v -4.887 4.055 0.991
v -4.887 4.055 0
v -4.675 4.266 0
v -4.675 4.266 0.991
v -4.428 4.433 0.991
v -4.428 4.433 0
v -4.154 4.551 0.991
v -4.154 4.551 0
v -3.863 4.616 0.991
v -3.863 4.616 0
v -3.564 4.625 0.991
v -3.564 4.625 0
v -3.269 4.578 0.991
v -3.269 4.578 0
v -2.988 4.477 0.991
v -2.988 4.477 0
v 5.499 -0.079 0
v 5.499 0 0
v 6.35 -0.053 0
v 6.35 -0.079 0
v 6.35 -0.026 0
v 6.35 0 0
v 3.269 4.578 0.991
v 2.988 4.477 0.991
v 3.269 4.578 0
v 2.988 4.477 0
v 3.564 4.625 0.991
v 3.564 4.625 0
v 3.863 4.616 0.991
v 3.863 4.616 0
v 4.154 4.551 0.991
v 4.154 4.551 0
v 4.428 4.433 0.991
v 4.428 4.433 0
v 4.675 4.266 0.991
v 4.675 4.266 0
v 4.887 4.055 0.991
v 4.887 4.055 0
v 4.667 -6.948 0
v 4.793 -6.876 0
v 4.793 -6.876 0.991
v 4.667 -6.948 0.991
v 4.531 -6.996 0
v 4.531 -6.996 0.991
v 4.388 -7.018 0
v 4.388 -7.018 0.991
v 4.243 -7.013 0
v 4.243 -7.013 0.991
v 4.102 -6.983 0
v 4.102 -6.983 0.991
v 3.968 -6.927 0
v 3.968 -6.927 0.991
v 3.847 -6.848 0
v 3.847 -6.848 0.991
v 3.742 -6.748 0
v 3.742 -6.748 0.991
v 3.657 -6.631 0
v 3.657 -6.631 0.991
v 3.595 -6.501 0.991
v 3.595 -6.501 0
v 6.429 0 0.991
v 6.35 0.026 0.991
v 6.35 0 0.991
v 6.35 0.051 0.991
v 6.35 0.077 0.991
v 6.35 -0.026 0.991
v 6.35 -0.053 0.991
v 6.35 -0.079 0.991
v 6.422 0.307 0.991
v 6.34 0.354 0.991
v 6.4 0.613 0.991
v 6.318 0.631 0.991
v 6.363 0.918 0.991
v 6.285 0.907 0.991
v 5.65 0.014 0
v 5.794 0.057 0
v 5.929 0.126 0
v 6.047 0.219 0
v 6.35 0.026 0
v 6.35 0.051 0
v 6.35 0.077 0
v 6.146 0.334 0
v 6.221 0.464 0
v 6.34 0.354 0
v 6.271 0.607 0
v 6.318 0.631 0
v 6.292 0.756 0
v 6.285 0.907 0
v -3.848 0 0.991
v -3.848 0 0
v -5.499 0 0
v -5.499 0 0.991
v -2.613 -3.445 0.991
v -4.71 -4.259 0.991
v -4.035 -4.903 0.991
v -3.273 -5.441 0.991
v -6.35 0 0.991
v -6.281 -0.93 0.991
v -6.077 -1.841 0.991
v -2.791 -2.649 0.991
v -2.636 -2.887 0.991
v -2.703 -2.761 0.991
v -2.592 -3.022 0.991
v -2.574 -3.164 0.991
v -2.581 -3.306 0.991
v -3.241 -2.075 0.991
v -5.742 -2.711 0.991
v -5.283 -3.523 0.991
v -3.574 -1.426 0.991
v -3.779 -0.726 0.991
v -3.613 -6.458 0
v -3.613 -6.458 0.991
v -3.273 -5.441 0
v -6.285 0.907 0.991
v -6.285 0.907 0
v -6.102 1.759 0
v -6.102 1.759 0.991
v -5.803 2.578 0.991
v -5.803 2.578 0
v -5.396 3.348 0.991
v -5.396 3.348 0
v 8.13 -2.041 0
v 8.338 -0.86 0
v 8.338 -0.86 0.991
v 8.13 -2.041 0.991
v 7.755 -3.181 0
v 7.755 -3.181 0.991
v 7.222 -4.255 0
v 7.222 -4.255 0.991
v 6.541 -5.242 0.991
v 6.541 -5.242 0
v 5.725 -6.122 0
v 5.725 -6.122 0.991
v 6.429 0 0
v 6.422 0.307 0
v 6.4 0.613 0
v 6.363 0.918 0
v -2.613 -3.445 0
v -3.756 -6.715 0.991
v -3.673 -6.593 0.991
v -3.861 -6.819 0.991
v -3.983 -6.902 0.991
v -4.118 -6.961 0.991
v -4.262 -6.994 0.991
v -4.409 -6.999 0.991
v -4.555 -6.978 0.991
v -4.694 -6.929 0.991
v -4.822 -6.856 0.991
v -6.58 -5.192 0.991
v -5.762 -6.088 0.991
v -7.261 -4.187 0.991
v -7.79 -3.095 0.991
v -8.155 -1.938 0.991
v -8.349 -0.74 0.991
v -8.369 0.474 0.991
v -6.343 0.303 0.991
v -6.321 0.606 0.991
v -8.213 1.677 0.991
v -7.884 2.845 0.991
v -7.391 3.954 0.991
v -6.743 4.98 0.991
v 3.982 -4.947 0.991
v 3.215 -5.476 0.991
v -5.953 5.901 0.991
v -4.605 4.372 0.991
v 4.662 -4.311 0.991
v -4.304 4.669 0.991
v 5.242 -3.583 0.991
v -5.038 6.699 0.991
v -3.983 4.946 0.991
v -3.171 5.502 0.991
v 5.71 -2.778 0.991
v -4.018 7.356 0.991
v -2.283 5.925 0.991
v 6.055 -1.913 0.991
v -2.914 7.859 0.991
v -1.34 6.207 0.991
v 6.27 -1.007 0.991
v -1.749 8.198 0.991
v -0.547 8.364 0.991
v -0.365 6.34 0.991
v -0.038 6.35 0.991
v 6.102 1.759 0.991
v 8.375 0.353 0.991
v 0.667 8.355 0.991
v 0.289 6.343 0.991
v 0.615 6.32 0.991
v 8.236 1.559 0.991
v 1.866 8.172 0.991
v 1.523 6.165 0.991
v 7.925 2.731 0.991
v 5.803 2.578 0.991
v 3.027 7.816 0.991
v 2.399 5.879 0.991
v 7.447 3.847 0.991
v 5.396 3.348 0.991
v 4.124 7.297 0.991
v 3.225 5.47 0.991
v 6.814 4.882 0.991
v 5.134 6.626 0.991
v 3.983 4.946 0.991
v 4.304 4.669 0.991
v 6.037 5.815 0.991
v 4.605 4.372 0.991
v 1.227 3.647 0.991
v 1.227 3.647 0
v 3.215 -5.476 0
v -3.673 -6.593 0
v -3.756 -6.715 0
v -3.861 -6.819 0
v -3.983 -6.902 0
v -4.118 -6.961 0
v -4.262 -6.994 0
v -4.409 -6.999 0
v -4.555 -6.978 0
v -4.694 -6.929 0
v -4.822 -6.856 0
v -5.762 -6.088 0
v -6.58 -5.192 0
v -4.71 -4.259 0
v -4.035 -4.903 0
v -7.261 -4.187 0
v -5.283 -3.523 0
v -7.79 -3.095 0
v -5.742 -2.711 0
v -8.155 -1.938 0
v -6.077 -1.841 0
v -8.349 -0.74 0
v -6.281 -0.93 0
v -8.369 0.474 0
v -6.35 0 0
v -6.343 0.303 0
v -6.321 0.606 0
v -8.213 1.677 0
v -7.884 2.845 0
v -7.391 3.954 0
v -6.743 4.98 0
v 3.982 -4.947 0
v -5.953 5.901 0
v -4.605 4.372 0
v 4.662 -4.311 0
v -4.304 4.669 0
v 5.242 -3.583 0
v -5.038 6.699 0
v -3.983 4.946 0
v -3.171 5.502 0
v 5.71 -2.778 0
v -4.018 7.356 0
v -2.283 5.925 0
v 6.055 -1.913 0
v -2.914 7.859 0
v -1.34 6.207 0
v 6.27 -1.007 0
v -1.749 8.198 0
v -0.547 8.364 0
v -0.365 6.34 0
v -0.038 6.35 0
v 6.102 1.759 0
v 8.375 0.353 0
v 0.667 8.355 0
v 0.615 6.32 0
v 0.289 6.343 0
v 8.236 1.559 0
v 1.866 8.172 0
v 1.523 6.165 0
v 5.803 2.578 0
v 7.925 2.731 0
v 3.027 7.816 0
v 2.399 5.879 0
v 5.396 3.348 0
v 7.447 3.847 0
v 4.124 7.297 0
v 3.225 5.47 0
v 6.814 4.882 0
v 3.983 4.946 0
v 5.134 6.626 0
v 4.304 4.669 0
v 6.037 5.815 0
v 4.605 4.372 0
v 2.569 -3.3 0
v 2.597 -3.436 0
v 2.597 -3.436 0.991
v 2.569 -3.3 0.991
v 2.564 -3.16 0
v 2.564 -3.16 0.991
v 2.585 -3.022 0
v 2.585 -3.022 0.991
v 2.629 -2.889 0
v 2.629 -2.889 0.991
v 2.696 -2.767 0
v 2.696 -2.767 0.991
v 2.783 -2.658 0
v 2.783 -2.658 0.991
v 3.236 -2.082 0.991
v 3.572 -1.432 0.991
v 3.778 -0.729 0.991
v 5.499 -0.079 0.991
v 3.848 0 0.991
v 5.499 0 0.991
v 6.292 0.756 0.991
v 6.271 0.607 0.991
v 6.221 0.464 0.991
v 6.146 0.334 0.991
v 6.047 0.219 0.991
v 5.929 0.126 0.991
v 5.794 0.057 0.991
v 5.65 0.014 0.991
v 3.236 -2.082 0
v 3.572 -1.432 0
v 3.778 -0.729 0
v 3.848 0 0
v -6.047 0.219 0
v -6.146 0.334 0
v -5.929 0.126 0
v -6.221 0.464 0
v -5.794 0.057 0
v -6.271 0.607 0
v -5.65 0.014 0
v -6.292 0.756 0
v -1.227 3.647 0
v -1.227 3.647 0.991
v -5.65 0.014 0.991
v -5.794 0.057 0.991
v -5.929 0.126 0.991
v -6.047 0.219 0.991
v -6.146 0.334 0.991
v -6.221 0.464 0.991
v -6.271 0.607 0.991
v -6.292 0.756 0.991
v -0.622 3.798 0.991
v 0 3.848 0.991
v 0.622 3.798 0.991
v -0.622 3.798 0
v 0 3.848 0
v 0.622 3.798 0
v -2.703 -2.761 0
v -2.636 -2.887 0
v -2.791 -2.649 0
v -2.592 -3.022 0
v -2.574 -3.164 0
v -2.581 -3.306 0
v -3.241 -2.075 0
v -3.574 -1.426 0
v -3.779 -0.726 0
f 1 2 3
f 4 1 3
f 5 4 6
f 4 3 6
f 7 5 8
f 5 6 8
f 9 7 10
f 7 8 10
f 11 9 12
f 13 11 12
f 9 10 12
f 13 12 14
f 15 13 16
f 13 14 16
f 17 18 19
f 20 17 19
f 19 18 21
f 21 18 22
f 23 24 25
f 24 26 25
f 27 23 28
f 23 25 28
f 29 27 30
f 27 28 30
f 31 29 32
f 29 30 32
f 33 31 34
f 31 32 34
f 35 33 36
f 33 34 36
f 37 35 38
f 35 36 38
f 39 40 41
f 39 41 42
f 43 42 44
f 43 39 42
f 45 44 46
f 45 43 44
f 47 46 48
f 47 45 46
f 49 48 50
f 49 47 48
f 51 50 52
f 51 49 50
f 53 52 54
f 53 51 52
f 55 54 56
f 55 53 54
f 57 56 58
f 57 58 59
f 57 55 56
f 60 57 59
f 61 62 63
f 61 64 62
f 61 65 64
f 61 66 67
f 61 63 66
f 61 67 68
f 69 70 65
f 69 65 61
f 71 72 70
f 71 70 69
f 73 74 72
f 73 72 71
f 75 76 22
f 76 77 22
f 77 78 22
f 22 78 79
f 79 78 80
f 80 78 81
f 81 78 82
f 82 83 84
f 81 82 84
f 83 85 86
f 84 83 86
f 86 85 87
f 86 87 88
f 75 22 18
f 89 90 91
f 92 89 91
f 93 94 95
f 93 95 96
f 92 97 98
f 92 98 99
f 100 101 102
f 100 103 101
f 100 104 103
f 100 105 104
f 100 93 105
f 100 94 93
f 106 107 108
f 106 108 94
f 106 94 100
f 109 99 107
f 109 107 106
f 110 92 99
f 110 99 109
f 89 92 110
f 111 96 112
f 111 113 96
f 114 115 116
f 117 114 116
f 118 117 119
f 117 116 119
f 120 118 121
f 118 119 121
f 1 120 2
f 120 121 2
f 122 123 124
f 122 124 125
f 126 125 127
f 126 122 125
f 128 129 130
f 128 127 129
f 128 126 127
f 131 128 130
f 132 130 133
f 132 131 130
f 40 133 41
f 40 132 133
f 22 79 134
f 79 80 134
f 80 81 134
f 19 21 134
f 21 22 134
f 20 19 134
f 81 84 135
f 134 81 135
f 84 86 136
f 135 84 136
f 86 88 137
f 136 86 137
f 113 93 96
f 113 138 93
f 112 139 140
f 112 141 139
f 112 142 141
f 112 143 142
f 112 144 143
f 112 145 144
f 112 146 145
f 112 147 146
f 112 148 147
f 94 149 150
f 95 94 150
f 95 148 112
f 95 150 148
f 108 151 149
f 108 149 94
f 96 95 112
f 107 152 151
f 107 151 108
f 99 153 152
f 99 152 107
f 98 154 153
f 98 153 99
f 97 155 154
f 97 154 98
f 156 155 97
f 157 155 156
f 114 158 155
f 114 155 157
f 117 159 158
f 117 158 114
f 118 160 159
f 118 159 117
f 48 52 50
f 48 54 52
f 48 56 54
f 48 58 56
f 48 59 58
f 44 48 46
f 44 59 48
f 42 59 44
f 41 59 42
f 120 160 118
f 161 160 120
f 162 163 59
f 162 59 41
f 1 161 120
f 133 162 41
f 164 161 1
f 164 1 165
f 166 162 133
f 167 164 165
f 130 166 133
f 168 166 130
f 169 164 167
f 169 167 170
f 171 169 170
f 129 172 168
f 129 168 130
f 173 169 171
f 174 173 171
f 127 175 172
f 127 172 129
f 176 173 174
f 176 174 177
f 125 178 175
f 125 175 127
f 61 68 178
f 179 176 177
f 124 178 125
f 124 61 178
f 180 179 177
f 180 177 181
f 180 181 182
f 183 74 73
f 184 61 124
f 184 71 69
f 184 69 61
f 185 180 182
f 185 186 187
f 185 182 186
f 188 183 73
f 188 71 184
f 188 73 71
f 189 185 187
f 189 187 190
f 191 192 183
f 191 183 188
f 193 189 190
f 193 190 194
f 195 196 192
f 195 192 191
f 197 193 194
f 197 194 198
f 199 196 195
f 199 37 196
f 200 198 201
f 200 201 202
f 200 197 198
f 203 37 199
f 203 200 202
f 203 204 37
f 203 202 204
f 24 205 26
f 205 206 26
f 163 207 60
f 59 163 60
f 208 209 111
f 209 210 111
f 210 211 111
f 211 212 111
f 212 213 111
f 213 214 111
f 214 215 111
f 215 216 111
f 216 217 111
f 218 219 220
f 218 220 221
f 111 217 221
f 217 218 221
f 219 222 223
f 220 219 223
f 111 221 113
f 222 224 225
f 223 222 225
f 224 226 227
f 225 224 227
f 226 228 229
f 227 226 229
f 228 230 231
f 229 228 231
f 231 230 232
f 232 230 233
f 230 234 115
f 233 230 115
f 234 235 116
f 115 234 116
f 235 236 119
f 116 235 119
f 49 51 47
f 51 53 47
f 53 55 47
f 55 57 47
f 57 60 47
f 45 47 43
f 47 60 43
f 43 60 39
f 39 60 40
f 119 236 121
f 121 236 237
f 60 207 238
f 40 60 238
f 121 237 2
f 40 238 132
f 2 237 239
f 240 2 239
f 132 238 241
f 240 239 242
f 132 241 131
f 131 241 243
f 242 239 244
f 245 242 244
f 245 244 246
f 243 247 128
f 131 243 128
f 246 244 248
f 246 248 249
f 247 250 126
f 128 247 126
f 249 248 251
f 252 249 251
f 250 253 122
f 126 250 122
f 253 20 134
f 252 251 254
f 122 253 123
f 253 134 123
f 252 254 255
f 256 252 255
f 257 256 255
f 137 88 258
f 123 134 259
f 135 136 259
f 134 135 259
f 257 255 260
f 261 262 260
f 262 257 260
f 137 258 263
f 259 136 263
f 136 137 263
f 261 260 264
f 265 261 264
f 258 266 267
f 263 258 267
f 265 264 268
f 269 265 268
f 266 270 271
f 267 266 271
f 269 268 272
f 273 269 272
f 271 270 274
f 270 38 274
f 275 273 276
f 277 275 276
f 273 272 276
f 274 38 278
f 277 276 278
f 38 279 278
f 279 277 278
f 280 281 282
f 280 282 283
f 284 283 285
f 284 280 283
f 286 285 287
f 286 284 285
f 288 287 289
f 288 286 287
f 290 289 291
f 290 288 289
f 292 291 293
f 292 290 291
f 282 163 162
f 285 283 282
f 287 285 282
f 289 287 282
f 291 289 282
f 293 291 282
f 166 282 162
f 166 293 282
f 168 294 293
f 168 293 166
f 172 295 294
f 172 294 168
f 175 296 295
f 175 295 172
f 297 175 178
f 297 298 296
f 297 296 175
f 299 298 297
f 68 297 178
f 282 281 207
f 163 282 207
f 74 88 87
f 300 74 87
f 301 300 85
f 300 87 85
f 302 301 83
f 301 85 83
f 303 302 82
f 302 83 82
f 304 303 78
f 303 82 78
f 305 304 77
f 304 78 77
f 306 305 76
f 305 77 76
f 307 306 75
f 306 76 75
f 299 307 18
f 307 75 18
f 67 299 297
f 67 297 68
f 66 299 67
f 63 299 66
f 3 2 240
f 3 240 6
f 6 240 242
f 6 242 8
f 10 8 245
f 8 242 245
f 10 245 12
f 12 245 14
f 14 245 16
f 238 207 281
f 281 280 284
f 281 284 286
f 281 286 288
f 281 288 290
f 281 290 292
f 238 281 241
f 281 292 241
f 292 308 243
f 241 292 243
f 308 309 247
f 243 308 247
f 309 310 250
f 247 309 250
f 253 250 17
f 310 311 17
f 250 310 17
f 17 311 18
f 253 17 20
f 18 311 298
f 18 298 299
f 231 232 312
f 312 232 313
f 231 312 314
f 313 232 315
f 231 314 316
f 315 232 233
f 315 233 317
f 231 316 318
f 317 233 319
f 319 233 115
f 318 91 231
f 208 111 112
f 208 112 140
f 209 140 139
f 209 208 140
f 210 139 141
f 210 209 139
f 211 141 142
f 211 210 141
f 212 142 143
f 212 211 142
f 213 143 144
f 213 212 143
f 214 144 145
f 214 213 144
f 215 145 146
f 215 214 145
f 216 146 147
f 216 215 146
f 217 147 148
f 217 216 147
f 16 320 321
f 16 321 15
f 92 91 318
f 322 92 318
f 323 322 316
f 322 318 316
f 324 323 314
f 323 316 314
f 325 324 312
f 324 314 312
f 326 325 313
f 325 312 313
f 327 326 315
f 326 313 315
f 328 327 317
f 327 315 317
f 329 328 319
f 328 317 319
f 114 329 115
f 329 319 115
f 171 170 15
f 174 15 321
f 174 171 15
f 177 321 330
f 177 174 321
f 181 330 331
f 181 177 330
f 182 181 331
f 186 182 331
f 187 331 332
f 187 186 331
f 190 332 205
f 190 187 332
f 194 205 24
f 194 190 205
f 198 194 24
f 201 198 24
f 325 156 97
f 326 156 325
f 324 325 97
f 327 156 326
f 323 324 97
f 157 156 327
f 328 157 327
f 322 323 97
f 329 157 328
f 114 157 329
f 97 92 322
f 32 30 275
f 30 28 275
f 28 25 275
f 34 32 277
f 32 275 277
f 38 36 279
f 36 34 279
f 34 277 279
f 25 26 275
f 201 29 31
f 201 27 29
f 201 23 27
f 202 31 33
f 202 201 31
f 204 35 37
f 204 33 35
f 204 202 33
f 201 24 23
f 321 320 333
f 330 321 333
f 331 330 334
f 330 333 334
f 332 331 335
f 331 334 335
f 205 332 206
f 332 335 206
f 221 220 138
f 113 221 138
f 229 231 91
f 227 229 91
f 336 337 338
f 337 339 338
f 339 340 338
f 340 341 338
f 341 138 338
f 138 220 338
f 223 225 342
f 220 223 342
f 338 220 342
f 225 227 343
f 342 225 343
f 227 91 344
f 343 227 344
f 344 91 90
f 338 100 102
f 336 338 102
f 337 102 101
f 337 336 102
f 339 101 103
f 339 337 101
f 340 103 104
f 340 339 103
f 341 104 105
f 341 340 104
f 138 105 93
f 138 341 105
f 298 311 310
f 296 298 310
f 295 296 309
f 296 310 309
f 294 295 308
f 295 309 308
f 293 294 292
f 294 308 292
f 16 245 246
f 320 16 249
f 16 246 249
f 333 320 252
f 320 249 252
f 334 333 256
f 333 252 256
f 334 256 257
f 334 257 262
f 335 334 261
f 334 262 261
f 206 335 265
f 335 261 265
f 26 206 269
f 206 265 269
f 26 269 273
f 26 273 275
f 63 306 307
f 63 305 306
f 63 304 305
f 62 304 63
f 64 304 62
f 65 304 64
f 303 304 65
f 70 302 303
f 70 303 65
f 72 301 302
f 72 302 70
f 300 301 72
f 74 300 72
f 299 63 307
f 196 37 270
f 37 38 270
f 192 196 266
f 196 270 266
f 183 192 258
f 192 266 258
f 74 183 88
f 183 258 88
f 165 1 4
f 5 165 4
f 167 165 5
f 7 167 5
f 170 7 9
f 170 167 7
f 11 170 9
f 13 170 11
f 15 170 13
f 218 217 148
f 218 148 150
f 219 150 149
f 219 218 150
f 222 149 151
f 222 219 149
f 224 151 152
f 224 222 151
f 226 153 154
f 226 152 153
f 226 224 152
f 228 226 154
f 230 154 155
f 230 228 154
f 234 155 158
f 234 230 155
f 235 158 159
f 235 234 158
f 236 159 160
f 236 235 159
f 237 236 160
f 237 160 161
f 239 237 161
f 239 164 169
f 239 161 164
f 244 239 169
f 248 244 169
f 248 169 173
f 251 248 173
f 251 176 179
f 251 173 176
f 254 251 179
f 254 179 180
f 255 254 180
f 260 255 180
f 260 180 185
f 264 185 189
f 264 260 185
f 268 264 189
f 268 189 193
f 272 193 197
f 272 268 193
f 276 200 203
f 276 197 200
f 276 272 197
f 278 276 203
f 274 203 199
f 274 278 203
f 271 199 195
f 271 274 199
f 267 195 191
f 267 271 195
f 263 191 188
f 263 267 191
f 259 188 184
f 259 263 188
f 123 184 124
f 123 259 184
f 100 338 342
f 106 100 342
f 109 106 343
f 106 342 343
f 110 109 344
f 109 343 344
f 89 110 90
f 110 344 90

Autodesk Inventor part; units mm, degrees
ref_plane "YZ Plane" through (0, 0, 0) normal (1, 0, 0) x (0, 1, 0)
ref_plane "XZ Plane" through (0, 0, 0) normal (0, 1, 0) x (-1, 0, 0)
ref_plane "XY Plane" through (0, 0, 0) normal (0, 0, 1) x (1, 0, 0)
sketch "Sketch1" plane through (0, 0, 0) normal (0, 0, 1) x (1, 0, 0)
  arc A0 (2.4541, -2.964) -> (-1.2271, 3.6472) centre (0, 0) ccw
  arc A1 (3.9291, -7.4041) -> (8.3378, -0.86) centre (0, 0) ccw
  arc A2 (-3.9827, 4.9457) -> (-6.35, 0) centre (0, 0) ccw
  line L0 (1.2271, 3.6472) -> (3.9827, 4.9457)
  line L1 (-1.2271, 3.6472) -> (-3.9827, 4.9457)
  line L2 (3.8481, 0) -> (6.35, 0)
  line L3 (-3.8481, 0) -> (-6.35, 0)
  line L4 (2.4541, -2.964) -> (3.2154, -5.4758)
  line L5 (-2.4541, -2.964) -> (-3.2731, -5.4414)
  arc A3 (3.9827, 4.9457) -> (0.615, 6.3202) centre (0, 0) ccw
  arc A4 (0.615, 6.3202) -> (-0.3654, 6.3395) centre (0, 0) ccw
  arc A5 (6.35, 0) -> (6.3495, 0.0769) centre (0, 0) ccw
  line L6 (3.2154, -5.4758) -> (3.9291, -7.4041)
  arc A6 (-3.9291, -7.4041) -> (3.9291, -7.4041) centre (0, 0) ccw
  arc A7 (8.3378, -0.86) -> (-3.9291, -7.4041) centre (0, 0) ccw
  arc A8 (-2.4541, -2.964) -> (2.4541, -2.964) centre (0, 0) ccw
  arc A9 (-6.35, 0) -> (6.35, 0) centre (0, 0) ccw
  arc A10 (-3.8481, 0) -> (-2.4541, -2.964) centre (0, 0) ccw
  arc A11 (-1.2271, 3.6472) -> (-3.8481, 0) centre (0, 0) ccw
  arc A12 (-0.3654, 6.3395) -> (-3.9827, 4.9457) centre (0, 0) ccw
  arc A13 (6.3495, 0.0769) -> (3.9827, 4.9457) centre (0, 0) ccw
  line L7 (-3.2731, -5.4414) -> (-3.9291, -7.4041)
  dimension "d0" = 16.764
  dimension "d1" = 7.6962
  dimension "d2" = 12.7
extrude "Extrusion1" add sketch "Sketch1" along normal blind 0.9906 contours A0 L2 A9 L4 | A9 A5 A13 A3 A4 A12 A2 L7 A7 A1 L6 | L5 A9 L3 A10 | A0 L1 A12 A4 A3 L0
fillet "Fillet1" radius 1.5875 2 edges at (-3.9827, 4.9457, 0.4953) (3.9827, 4.9457, 0.4953)
fillet "Fillet2" radius 0.7937 6 edges at (-6.35, 0, 0.4953) (6.35, 0, 0.4953) (-2.4541, -2.964, 0.4953) (2.4541, -2.964, 0.4953) (3.9291, -7.4041, 0.4953) (-3.9291, -7.4041, 0.4953)
properties part number "e clip .375in x ,039"
